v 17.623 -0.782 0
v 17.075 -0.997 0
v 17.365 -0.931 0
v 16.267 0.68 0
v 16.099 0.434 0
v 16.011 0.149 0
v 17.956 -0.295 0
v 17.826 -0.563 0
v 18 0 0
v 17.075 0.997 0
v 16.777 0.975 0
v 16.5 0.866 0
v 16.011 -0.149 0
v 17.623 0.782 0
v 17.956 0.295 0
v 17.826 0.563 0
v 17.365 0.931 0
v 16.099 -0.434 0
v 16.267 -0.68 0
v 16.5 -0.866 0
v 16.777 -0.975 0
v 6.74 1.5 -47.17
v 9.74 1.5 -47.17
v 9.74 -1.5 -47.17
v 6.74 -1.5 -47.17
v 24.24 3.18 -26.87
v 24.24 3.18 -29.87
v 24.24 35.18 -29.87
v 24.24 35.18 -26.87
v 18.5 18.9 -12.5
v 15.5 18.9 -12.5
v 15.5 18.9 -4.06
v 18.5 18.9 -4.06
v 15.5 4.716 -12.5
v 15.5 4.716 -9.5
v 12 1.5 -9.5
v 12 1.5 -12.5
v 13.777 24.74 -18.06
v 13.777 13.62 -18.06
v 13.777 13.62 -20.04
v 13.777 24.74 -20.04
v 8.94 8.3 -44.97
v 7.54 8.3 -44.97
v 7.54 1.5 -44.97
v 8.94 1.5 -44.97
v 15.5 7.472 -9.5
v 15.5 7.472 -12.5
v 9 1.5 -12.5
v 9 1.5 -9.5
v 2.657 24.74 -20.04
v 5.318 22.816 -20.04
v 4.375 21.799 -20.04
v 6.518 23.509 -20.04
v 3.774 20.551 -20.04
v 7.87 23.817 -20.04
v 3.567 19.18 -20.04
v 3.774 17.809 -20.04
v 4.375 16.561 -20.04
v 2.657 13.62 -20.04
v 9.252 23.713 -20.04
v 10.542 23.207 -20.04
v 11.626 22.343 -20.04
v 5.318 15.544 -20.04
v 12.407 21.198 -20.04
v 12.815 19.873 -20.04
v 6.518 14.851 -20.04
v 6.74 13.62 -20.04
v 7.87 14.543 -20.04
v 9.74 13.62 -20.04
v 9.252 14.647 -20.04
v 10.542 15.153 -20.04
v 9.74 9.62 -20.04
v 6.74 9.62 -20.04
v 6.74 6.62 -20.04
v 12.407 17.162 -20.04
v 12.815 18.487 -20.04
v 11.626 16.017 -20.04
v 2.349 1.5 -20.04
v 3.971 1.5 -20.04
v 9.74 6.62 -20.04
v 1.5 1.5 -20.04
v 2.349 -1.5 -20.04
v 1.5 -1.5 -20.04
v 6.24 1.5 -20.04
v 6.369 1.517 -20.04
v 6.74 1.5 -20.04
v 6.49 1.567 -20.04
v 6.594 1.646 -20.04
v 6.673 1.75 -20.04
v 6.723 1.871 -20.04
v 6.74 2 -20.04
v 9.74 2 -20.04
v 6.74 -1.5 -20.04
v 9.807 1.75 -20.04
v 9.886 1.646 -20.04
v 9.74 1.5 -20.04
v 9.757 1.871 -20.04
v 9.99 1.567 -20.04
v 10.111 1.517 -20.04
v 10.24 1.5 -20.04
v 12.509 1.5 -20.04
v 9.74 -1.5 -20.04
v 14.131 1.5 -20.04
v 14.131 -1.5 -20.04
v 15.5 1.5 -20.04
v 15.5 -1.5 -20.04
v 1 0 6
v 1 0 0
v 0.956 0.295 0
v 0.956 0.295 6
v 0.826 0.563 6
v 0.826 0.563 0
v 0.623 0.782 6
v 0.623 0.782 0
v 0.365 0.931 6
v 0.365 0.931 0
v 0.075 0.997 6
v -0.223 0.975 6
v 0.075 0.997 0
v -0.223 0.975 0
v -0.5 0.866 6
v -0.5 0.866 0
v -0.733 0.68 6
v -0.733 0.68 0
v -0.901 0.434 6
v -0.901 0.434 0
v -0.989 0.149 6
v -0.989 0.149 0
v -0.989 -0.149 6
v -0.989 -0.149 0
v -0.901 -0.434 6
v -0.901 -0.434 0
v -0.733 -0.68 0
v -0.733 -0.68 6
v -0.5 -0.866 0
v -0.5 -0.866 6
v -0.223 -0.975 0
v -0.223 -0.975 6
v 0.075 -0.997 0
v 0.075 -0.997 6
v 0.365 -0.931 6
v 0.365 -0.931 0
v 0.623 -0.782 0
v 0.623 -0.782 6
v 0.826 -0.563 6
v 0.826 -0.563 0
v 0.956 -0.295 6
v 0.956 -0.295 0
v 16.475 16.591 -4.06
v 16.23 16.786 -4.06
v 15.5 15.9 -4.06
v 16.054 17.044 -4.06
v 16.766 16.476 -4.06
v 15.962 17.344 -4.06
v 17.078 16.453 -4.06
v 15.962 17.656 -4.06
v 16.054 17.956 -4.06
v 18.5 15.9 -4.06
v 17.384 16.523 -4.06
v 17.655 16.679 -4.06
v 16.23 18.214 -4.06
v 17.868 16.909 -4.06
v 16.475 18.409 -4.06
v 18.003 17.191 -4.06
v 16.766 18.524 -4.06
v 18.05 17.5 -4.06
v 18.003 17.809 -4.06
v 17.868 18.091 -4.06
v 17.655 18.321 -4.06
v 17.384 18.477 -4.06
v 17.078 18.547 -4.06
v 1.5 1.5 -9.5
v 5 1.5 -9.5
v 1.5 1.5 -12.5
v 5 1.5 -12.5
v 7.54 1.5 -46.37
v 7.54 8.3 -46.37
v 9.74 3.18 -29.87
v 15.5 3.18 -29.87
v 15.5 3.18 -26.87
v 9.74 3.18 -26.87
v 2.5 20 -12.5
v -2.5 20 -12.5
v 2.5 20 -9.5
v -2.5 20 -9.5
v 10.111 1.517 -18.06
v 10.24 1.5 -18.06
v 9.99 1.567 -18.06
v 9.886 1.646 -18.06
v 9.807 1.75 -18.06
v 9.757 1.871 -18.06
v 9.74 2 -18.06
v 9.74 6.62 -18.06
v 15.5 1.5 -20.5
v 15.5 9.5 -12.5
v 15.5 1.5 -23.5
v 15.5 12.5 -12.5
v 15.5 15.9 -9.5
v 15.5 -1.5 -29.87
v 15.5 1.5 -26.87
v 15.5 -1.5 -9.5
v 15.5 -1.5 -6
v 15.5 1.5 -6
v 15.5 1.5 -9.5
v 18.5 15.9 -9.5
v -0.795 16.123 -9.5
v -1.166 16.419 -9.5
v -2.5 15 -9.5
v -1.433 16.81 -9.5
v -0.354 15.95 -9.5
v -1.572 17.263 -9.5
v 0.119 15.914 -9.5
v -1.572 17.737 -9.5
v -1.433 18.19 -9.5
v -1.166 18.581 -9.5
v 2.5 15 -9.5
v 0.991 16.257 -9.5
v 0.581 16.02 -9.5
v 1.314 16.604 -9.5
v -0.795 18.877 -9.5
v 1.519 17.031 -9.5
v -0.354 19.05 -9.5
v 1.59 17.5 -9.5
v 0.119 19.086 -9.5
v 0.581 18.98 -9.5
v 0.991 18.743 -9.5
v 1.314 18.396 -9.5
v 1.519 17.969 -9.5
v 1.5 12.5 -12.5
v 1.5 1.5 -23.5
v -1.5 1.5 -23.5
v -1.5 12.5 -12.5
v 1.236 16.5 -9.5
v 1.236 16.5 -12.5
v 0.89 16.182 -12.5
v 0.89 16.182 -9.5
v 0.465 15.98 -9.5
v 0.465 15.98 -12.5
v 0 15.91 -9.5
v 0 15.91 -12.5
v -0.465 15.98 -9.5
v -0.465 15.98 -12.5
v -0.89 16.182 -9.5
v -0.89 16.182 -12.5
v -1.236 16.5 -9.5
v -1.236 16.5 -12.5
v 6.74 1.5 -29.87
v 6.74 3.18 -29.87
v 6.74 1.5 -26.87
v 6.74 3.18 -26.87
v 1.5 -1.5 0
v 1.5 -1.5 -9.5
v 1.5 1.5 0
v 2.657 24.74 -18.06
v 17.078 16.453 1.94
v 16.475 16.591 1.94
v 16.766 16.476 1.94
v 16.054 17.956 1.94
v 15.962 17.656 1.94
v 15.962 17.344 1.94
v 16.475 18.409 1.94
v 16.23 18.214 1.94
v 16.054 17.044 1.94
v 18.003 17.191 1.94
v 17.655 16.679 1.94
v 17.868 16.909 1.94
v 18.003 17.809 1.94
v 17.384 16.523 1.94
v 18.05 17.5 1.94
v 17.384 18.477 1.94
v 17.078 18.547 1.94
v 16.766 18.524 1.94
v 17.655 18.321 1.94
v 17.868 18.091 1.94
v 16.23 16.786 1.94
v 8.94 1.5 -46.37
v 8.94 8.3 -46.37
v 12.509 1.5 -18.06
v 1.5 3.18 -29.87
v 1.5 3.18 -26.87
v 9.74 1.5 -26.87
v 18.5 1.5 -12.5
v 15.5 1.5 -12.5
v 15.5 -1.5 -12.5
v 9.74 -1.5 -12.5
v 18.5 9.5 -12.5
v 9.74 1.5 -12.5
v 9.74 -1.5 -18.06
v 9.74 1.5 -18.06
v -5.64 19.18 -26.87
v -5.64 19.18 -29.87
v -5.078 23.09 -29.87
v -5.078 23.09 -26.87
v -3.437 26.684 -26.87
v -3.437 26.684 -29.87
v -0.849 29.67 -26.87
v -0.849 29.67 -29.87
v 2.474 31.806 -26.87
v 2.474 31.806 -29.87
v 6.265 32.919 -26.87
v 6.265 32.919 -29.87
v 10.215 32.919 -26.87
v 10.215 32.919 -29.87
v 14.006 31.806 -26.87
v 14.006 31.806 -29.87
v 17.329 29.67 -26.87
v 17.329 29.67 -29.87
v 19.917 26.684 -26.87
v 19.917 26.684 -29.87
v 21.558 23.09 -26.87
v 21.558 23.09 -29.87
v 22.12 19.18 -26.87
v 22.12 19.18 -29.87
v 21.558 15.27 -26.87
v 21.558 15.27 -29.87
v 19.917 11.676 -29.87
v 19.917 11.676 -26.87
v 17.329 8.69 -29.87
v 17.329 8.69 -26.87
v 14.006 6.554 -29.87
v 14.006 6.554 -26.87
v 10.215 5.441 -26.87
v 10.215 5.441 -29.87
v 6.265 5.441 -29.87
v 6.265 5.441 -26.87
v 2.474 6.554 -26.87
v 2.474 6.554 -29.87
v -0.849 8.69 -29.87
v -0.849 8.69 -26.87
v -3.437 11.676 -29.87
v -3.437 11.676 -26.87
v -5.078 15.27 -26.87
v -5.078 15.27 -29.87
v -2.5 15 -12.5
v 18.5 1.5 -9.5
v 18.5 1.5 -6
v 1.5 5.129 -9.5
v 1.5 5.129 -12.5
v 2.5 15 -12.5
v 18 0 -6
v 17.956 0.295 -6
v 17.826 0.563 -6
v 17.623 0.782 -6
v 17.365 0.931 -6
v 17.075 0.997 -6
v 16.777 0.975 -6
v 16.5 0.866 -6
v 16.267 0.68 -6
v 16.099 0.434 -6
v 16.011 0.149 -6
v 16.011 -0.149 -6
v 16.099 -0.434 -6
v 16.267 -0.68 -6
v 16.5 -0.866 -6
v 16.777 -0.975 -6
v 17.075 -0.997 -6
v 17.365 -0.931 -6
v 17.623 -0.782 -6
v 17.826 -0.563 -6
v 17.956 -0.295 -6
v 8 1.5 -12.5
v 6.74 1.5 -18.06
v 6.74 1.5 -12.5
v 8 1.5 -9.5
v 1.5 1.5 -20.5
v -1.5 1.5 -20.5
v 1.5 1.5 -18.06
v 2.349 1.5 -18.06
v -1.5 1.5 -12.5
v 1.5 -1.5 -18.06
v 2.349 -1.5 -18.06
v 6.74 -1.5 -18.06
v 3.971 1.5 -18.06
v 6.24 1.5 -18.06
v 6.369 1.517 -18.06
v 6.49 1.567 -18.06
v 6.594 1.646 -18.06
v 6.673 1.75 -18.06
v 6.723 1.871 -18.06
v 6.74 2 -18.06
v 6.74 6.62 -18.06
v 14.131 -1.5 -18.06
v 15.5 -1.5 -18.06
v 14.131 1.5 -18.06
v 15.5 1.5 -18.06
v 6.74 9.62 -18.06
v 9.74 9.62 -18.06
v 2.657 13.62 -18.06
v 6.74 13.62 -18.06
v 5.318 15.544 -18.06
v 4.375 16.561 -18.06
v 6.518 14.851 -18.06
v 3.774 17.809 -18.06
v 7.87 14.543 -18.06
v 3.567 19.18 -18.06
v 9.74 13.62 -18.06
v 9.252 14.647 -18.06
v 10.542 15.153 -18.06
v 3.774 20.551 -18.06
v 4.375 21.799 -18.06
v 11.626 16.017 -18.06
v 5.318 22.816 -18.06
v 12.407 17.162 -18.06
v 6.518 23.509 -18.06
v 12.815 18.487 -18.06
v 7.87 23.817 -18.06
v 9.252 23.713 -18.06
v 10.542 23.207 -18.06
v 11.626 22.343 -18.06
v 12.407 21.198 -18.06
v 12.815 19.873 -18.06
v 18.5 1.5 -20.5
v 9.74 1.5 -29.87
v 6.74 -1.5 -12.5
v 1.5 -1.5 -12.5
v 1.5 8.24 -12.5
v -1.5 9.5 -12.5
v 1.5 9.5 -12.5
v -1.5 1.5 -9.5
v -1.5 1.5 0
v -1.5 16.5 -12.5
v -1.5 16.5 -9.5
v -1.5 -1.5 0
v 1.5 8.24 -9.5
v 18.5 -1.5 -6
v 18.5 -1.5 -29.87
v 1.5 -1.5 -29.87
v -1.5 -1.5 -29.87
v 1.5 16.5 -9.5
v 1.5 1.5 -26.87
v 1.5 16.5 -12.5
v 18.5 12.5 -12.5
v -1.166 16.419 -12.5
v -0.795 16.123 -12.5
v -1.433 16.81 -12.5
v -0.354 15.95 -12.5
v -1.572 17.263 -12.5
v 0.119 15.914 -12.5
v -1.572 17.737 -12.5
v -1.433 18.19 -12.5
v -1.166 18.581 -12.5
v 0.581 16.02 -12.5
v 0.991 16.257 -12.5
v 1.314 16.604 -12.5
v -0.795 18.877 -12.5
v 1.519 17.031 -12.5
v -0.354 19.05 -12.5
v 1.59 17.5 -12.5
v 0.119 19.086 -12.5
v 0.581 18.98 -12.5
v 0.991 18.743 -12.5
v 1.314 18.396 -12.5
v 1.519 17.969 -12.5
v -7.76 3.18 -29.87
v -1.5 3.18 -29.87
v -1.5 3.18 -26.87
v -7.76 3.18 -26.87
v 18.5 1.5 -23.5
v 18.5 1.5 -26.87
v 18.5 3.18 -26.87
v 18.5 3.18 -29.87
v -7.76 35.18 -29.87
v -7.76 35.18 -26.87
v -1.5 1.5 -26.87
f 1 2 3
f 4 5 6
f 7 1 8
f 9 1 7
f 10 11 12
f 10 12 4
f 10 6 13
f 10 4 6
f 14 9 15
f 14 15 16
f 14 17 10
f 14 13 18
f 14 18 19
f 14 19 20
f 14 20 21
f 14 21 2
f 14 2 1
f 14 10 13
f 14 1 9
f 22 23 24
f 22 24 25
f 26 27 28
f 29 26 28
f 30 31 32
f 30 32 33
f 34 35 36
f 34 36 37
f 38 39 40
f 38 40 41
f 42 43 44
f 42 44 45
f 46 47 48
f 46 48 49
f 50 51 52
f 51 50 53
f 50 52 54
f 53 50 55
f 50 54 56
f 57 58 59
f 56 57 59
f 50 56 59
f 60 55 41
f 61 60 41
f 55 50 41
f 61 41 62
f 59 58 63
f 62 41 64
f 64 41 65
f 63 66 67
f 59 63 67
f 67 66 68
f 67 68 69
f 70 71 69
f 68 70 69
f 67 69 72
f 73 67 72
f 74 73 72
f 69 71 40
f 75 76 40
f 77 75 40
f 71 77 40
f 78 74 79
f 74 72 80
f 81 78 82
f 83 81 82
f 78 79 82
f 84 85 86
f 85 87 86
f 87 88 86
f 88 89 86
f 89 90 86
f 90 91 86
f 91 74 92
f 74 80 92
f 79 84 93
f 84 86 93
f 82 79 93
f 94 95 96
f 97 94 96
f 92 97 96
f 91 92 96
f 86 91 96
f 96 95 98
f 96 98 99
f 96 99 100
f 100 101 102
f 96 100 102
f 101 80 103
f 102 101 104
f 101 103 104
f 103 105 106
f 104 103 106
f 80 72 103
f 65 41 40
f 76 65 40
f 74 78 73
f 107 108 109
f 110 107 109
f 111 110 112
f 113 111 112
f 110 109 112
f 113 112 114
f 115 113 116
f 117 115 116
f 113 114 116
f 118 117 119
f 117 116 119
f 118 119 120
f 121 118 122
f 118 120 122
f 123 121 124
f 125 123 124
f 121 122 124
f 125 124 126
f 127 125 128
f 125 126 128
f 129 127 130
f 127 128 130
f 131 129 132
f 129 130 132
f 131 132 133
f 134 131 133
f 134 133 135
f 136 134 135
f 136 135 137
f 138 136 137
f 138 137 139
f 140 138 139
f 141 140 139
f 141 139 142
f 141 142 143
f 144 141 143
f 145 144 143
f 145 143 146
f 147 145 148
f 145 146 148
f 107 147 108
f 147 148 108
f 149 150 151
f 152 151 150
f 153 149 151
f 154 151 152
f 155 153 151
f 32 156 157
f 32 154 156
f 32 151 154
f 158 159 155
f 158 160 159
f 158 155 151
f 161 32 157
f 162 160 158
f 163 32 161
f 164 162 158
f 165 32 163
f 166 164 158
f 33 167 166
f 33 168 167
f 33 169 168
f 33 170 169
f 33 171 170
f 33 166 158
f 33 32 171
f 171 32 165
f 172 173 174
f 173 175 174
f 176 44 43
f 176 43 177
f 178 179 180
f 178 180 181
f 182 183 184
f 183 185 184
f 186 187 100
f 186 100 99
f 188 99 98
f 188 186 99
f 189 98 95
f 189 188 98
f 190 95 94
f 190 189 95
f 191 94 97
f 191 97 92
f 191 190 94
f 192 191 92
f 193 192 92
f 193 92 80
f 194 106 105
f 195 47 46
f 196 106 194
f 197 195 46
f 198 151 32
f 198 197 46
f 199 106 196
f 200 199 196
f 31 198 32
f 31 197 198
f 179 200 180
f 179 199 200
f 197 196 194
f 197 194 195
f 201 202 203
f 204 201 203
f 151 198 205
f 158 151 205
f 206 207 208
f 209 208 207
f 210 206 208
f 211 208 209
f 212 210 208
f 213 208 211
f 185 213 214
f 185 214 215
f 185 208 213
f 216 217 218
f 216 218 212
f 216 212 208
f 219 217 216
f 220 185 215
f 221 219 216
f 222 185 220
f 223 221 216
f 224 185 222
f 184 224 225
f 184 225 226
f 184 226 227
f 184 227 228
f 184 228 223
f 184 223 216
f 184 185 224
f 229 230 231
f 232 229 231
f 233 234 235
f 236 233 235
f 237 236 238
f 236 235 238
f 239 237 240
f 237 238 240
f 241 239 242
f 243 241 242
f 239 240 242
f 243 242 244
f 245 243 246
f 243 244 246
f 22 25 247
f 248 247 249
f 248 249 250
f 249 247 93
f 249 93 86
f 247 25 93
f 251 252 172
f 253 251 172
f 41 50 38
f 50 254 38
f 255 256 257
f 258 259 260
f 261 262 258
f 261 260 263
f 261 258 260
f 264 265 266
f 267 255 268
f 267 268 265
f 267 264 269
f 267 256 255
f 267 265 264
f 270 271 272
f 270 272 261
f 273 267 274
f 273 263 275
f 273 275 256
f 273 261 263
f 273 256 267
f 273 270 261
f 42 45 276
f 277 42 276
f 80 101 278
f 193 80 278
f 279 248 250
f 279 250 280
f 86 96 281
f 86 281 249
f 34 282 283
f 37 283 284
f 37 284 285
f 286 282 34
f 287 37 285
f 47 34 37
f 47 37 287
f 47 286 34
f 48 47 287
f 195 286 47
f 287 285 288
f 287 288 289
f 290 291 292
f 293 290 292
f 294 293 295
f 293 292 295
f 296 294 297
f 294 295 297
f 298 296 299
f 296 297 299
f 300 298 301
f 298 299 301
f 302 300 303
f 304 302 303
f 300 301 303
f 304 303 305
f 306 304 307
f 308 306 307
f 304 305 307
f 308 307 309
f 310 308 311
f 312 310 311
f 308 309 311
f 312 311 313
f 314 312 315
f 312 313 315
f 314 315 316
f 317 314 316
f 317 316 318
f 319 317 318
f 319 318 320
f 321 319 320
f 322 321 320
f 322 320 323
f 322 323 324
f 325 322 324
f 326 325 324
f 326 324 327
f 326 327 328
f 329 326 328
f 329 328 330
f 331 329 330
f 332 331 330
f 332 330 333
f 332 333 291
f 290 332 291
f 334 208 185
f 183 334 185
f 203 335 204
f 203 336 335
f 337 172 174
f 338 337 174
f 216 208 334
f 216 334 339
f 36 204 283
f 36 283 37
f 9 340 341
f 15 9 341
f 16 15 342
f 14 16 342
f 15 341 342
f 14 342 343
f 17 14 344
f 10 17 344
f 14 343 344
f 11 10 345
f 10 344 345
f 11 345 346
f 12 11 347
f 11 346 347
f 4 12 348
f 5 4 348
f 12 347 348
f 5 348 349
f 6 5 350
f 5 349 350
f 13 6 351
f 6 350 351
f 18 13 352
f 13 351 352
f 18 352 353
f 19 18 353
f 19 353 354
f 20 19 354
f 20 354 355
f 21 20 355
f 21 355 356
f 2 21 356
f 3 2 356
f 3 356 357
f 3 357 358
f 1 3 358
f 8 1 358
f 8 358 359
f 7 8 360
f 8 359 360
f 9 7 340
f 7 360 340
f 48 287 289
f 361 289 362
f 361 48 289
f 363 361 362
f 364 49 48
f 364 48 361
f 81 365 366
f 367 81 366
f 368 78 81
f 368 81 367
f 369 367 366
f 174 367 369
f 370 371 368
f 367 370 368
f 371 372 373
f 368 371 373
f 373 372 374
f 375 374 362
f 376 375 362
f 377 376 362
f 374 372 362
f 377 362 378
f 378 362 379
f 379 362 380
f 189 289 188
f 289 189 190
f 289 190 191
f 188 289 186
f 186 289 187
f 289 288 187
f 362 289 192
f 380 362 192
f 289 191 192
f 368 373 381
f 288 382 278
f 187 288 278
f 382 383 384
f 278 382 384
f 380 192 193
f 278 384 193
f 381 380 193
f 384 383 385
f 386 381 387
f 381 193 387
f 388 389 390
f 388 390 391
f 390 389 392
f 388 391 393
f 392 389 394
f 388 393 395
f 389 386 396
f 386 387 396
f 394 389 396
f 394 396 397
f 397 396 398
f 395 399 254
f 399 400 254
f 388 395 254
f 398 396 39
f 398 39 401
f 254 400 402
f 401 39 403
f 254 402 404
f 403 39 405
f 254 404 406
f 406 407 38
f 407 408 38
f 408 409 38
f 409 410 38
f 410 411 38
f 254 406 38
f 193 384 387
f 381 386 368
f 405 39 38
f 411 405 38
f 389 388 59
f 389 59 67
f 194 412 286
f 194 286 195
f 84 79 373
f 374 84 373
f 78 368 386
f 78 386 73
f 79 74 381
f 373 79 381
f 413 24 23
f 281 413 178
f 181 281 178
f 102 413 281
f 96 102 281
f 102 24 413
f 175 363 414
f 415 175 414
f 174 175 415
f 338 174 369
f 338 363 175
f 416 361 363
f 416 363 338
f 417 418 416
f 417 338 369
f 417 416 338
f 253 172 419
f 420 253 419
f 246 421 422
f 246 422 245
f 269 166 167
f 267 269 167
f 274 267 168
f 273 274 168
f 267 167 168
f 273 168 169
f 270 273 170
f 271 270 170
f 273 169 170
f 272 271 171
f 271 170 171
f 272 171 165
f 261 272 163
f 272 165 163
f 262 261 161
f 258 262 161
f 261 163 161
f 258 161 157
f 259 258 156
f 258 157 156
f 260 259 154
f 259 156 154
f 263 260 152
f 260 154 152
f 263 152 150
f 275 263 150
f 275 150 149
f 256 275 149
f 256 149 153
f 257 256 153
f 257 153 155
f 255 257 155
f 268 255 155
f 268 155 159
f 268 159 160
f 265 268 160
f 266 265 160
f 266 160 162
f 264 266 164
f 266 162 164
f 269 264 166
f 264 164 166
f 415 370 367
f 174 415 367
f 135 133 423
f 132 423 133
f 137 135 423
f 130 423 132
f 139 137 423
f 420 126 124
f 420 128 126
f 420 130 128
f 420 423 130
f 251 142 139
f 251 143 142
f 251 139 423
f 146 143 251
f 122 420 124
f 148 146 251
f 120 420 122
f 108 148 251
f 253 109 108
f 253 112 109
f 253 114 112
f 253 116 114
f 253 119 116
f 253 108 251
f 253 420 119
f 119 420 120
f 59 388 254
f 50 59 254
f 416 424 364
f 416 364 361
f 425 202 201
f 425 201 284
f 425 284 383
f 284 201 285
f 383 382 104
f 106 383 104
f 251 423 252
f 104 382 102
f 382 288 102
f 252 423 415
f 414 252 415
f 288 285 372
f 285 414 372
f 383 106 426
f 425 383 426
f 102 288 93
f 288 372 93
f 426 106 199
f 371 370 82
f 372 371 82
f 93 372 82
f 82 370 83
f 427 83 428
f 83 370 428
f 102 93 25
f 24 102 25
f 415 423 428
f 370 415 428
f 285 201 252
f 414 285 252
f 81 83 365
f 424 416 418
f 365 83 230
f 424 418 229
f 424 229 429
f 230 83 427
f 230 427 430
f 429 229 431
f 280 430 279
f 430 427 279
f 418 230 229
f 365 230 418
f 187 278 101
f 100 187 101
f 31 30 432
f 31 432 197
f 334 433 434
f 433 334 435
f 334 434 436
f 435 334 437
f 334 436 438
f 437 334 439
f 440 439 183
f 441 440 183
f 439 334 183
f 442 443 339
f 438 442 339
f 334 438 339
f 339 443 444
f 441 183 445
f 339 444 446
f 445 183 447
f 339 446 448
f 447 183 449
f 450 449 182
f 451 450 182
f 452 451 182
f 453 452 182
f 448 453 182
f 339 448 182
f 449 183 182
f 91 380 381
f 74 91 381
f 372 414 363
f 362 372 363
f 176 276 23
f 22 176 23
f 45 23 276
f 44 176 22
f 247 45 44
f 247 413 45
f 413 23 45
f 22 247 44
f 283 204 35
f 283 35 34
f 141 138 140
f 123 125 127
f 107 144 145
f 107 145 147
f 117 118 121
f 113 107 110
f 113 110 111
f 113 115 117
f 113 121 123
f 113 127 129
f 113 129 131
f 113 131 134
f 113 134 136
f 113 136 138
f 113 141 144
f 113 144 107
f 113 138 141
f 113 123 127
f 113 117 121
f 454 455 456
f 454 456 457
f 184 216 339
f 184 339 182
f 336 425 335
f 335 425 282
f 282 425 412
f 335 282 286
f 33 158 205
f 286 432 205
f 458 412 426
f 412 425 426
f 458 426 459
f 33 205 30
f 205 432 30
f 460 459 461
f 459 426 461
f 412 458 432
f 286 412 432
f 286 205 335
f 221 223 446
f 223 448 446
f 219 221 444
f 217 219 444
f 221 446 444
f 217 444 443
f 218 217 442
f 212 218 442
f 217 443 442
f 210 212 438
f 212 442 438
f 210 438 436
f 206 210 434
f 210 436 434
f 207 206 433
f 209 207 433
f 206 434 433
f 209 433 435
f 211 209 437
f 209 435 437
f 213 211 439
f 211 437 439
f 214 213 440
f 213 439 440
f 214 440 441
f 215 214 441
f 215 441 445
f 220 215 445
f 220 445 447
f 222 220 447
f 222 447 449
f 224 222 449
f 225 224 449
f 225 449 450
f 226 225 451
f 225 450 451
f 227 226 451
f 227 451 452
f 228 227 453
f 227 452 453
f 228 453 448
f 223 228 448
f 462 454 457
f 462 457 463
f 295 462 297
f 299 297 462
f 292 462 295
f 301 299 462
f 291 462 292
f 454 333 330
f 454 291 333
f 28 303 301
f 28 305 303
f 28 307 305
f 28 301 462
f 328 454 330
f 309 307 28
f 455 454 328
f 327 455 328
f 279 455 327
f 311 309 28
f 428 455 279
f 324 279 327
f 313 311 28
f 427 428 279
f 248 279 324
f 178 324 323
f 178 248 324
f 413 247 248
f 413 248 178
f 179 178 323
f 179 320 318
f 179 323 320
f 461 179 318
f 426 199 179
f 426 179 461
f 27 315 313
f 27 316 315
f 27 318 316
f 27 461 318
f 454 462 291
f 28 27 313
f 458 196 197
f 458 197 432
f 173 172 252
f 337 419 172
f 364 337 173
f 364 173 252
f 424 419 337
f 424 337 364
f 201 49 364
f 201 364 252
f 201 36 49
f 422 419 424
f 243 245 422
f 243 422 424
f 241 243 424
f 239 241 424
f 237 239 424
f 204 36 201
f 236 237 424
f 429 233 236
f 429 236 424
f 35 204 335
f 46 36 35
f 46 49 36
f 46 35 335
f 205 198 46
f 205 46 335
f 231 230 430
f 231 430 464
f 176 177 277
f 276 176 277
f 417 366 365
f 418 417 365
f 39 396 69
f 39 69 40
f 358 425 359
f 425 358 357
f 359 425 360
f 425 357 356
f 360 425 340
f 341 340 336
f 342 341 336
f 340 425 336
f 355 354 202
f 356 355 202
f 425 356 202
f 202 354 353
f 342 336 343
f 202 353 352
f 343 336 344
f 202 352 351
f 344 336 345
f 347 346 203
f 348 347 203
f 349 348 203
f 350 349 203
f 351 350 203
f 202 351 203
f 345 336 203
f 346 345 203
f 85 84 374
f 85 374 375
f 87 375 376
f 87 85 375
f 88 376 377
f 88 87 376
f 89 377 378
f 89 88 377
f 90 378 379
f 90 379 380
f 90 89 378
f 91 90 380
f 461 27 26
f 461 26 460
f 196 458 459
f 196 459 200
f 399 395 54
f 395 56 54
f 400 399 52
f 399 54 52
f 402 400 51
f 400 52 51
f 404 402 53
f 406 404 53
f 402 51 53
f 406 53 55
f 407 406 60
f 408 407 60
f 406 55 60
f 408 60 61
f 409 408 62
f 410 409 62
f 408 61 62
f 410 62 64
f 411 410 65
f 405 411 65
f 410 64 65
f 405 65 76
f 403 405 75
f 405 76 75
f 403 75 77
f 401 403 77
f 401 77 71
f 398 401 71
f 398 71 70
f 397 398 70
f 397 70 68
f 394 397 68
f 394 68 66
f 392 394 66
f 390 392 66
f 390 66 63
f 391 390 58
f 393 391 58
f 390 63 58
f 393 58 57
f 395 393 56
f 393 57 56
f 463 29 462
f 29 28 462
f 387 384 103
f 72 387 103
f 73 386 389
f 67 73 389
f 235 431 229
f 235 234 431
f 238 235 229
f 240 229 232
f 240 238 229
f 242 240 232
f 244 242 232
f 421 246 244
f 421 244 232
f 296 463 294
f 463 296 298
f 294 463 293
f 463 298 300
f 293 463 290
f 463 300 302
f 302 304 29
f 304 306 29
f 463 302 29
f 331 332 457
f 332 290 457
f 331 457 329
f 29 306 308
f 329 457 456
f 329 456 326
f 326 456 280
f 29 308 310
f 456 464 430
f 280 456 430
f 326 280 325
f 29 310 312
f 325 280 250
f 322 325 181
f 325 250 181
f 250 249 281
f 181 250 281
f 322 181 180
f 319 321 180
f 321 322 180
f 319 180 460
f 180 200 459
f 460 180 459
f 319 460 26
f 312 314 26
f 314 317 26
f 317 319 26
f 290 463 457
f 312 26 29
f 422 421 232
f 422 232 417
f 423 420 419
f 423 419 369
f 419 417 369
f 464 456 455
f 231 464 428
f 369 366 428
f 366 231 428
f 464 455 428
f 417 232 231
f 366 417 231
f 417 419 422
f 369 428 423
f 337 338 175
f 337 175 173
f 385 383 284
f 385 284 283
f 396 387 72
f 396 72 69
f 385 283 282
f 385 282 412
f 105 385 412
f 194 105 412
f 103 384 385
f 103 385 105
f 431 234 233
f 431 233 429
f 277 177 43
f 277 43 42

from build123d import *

# Parameters (mm, degrees)
SKETCH3_W            = 3
SKETCH3_H            = 3
SKETCH7_W            = 3
SKETCH7_H            = 3
BOSS_EXTRUDE1_DEPTH  = 16.5
SKETCH12_W           = 5
SKETCH12_H           = 5
BOSS_EXTRUDE4_DEPTH  = 1.5
SKETCH17_R           = 1
BOSS_EXTRUDE5_DEPTH  = 6
SKETCH18_R           = 1
BOSS_EXTRUDE6_DEPTH  = 6
SKETCH19_W           = 3
SKETCH19_H           = 3
BOSS_EXTRUDE7_DEPTH  = 7.54
SKETCH21_W           = 3
SKETCH21_H           = 1.98
BOSS_EXTRUDE8_DEPTH  = 17.68
SKETCH22_W           = 11.12
SKETCH22_H           = 11.12
BOSS_EXTRUDE9_DEPTH  = 0.99
SKETCH23_R           = 4.65
CUT_EXTRUDE2_DEPTH   = 2.5
SKETCH24_W           = 3
SKETCH24_H           = 3
BOSS_EXTRUDE10_DEPTH = 9.83
SKETCH25_W           = 3
SKETCH25_H           = 3
BOSS_EXTRUDE11_DEPTH = 3
SKETCH27_W           = 32
SKETCH27_H           = 32
BOSS_EXTRUDE12_DEPTH = 1.5
SKETCH28_R           = 13.88
CUT_EXTRUDE3_DEPTH   = 7
SKETCH31_W           = 3
SKETCH31_H           = 3
BOSS_EXTRUDE13_DEPTH = 17.3
SKETCH32_W           = 1.4
SKETCH32_H           = 1.4
BOSS_EXTRUDE14_DEPTH = 6.8
SKETCH33_W           = 3
SKETCH33_H           = 3
BOSS_EXTRUDE15_DEPTH = 17.37
SKETCH34_W           = 3
SKETCH34_H           = 3
BOSS_EXTRUDE16_DEPTH = 5.5
SKETCH36_W           = 3
SKETCH36_H           = 3
SKETCH16_R           = 1.59
CUT_EXTRUDE7_DEPTH   = 5
SKETCH41_W           = 3
SKETCH41_H           = 3
BOSS_EXTRUDE17_DEPTH = 17.37
SKETCH42_W           = 3
SKETCH42_H           = 3
BOSS_EXTRUDE18_DEPTH = 5
SKETCH43_W           = 3
SKETCH43_H           = 3
BOSS_EXTRUDE19_DEPTH = 17.4
SKETCH47_W           = 3
SKETCH47_H           = 3
SKETCH53_W           = 3
SKETCH53_H           = 3
BOSS_EXTRUDE20_REACH = 63.391
SKETCH55_W           = 1.98
SKETCH55_H           = 3
BOSS_EXTRUDE21_REACH = 63.391
SKETCH56_W           = 1.98
SKETCH56_H           = 3
FILLET1_R            = 0.5
FILLET2_R            = 0.5
SKETCH57_W           = 1.98
SKETCH57_H           = 3
SKETCH59_W           = 3
SKETCH59_H           = 3
BOSS_EXTRUDE22_DEPTH = 5.44
SKETCH63_R           = 1.05
BOSS_EXTRUDE25_DEPTH = 6


with BuildPart() as part:
    # Sweep3: sweep along a path in Sketch4
    with BuildLine(Plane(origin=(0, 0, 0), x_dir=(1, 0, 0), z_dir=(0, 1, 0))) as sweep3_path:
        Line((0, 0), (0, 11))
        Line((0, 11), (17, 11))
        Line((17, 11), (17, 6))
    # Sketch3 → Sweep3 (sweep)
    with BuildSketch(Plane.XY):
        Rectangle(SKETCH3_W, SKETCH3_H)
    sweep(path=sweep3_path.line, transition=Transition.RIGHT)

    # Sketch7 → Boss-Extrude1 (add)
    with BuildSketch(Plane(origin=(0, 0, 0), x_dir=(1, 0, 0), z_dir=(0, 1, 0))):
        with Locations((0, 11)):
            Rectangle(SKETCH7_W, SKETCH7_H)
    extrude(amount=BOSS_EXTRUDE1_DEPTH)

    # Sketch17 → Boss-Extrude5 (add)
    with BuildSketch(Plane.XY):
        Circle(SKETCH17_R)
    extrude(amount=BOSS_EXTRUDE5_DEPTH)

    # Sketch18 → Boss-Extrude6 (add)
    with BuildSketch(Plane.XY.offset(-6)):
        with Locations((17, 0)):
            Circle(SKETCH18_R)
    extrude(amount=BOSS_EXTRUDE6_DEPTH)

    # Sweep4: sweep along a path in Sketch39
    with BuildLine(Plane.XY.offset(-11)) as sweep4_path:
        Line((6.5, 1.5), (0, 8.24))
    # Sketch36 → Sweep4 (sweep)
    with BuildSketch(Plane(origin=(0, 1.5, 0), x_dir=(1, 0, 0), z_dir=(0, 1, 0))):
        with Locations((6.5, 11)):
            Rectangle(SKETCH36_W, SKETCH36_H)
    sweep(path=sweep4_path.line)


with BuildPart() as body_2:
    # Sketch12 → Boss-Extrude4 (new, symmetric)
    with BuildSketch(Plane.XY.offset(-11)):
        with Locations((0, 17.5)):
            Rectangle(SKETCH12_W, SKETCH12_H)
    extrude(amount=BOSS_EXTRUDE4_DEPTH, both=True)


with BuildPart() as body_3:
    # Sketch19 → Boss-Extrude7 (new body)
    with BuildSketch(Plane.XY.offset(-12.5)):
        with Locations((8.24, 0)):
            Rectangle(SKETCH19_W, SKETCH19_H)
    extrude(amount=-BOSS_EXTRUDE7_DEPTH)

    # Sketch21 → Boss-Extrude8 (add)
    with BuildSketch(Plane(origin=(0, 1.5, 0), x_dir=(1, 0, 0), z_dir=(0, 1, 0))):
        with Locations((8.24, 19.05)):
            Rectangle(SKETCH21_W, SKETCH21_H)
    extrude(amount=BOSS_EXTRUDE8_DEPTH)

    # Sketch22 → Boss-Extrude9 (add, symmetric)
    with BuildSketch(Plane.XY.offset(-19.05)):
        with Locations((8.217064706, 19.179985124)):
            Rectangle(SKETCH22_W, SKETCH22_H)
    extrude(amount=BOSS_EXTRUDE9_DEPTH, both=True)

    # Sketch23 → Cut-Extrude2 (cut, symmetric)
    with BuildSketch(Plane(origin=(0, 0, -20.04), x_dir=(-1, 0, 0), z_dir=(0, 0, -1))):
        with Locations((-8.217064706, 19.179985124)):
            Circle(SKETCH23_R)
    extrude(amount=CUT_EXTRUDE2_DEPTH, both=True, mode=Mode.SUBTRACT)

    # Sketch24 → Boss-Extrude10 (add)
    with BuildSketch(Plane(origin=(0, 0, -20.04), x_dir=(-1, 0, 0), z_dir=(0, 0, -1))):
        with Locations((-8.24, 0)):
            Rectangle(SKETCH24_W, SKETCH24_H)
    extrude(amount=BOSS_EXTRUDE10_DEPTH)

    # Sketch25 → Boss-Extrude11 (add)
    with BuildSketch(Plane(origin=(0, 1.5, 0), x_dir=(1, 0, 0), z_dir=(0, 1, 0))):
        with Locations((8.24, 28.37)):
            Rectangle(SKETCH25_W, SKETCH25_H)
    extrude(amount=BOSS_EXTRUDE11_DEPTH)

    # Sketch27 → Boss-Extrude12 (add, symmetric)
    with BuildSketch(Plane(origin=(0, 0, -28.37), x_dir=(-1, 0, 0), z_dir=(0, 0, -1))):
        with Locations((-8.24, 19.18)):
            Rectangle(SKETCH27_W, SKETCH27_H)
    extrude(amount=BOSS_EXTRUDE12_DEPTH, both=True)

    # Sketch28 → Cut-Extrude3 (cut)
    with BuildSketch(Plane(origin=(0, 0, -29.87), x_dir=(-1, 0, 0), z_dir=(0, 0, -1))):
        with Locations((-8.24, 19.18)):
            Circle(SKETCH28_R)
    extrude(amount=-CUT_EXTRUDE3_DEPTH, mode=Mode.SUBTRACT)

    # Sketch31 → Boss-Extrude13 (add)
    with BuildSketch(Plane(origin=(0, 0, -29.87), x_dir=(-1, 0, 0), z_dir=(0, 0, -1))):
        with Locations((-8.24, 0)):
            Rectangle(SKETCH31_W, SKETCH31_H)
    extrude(amount=BOSS_EXTRUDE13_DEPTH)

    # Sketch32 → Boss-Extrude14 (add)
    with BuildSketch(Plane(origin=(0, 1.5, 0), x_dir=(1, 0, 0), z_dir=(0, 1, 0))):
        with Locations((8.24, 45.67)):
            Rectangle(SKETCH32_W, SKETCH32_H)
    extrude(amount=BOSS_EXTRUDE14_DEPTH)



with BuildPart() as body_4:
    # Sketch33 → Boss-Extrude15 (new body)
    with BuildSketch(Plane(origin=(0, 0, -12.5), x_dir=(-1, 0, 0), z_dir=(0, 0, -1))):
        with Locations((-17, 0)):
            Rectangle(SKETCH33_W, SKETCH33_H)
    extrude(amount=BOSS_EXTRUDE15_DEPTH)

    # Sketch34 → Boss-Extrude16 (add)
    with BuildSketch(Plane(origin=(0, 1.5, 0), x_dir=(1, 0, 0), z_dir=(0, 1, 0))):
        with Locations((17, 28.37)):
            Rectangle(SKETCH34_W, SKETCH34_H)
    extrude(amount=BOSS_EXTRUDE16_DEPTH)


with BuildPart() as cut_extrude7_tool:
    # Sketch16 → Cut-Extrude7 (new, symmetric)
    with BuildSketch(Plane(origin=(0, 0, -12.5), x_dir=(-1, 0, 0), z_dir=(0, 0, -1))):
        with Locations(Location((0, 17.5, 0), (0, 0, 180))):
            Circle(SKETCH16_R)
    extrude(amount=CUT_EXTRUDE7_DEPTH, both=True)


with BuildPart() as part_1:
    add(part.part)

    # Cut-Extrude7: cut by cut_extrude7_tool
    add(cut_extrude7_tool.part, mode=Mode.SUBTRACT)


with BuildPart() as body_2_1:
    add(body_2.part)

    # Cut-Extrude7: cut by cut_extrude7_tool
    add(cut_extrude7_tool.part, mode=Mode.SUBTRACT)


with BuildPart() as body_3_1:
    add(body_3.part)

    add(part_1.part)  # Boss-Extrude17 merges part
    # Sketch41 → Boss-Extrude17 (add)
    with BuildSketch(Plane(origin=(0, 0, -12.5), x_dir=(-1, 0, 0), z_dir=(0, 0, -1))):
        Rectangle(SKETCH41_W, SKETCH41_H)
    extrude(amount=BOSS_EXTRUDE17_DEPTH)

    # Sketch42 → Boss-Extrude18 (add)
    with BuildSketch(Plane(origin=(0, 1.5, 0), x_dir=(1, 0, 0), z_dir=(0, 1, 0))):
        with Locations((0, 28.37)):
            Rectangle(SKETCH42_W, SKETCH42_H)
    extrude(amount=BOSS_EXTRUDE18_DEPTH)


    add(body_4.part)  # Boss-Extrude19 merges body 4
    # Sketch43 → Boss-Extrude19 (add)
    with BuildSketch(Plane(origin=(0, 1.5, 0), x_dir=(1, 0, 0), z_dir=(0, 1, 0))):
        with Locations((17, 11)):
            Rectangle(SKETCH43_W, SKETCH43_H)
    extrude(amount=BOSS_EXTRUDE19_DEPTH)

    # Sweep5: sweep along a path in Sketch51
    with BuildLine(Plane.XY.offset(-11)) as sweep5_path:
        Line((10.5, 1.5), (17, 7.472026952))
    # Sketch47 → Sweep5 (sweep)
    with BuildSketch(Plane(origin=(0, 1.5, 0), x_dir=(1, 0, 0), z_dir=(0, 1, 0))):
        with Locations((10.5, 11)):
            Rectangle(SKETCH47_W, SKETCH47_H)
    sweep(path=sweep5_path.line)

    # Sweep6: sweep along a path in Sketch54
    with BuildLine(Plane.ZY.offset(1.5)) as sweep6_path:
        Line((-12.5, 11), (-23.5, 0))
    # Sketch53 → Sweep6 (sweep)
    with BuildSketch(Plane.XY.offset(-12.5)):
        with Locations((0, 11)):
            Rectangle(SKETCH53_W, SKETCH53_H)
    sweep6 = sweep(path=sweep6_path.line)

    # Mirror11: Sweep6 across plane
    add(sweep6.mirror(Plane.ZY.offset(-8.5)))

    # Sketch55 → Boss-Extrude20 (add, up to next)
    with BuildSketch(Plane.ZY.offset(-6.74), mode=Mode.PRIVATE) as boss_extrude20_sk1:
        with Locations((-19.05, 0)):
            Rectangle(SKETCH55_W, SKETCH55_H)
    boss_extrude20_tool1 = extrude(boss_extrude20_sk1.sketch, amount=BOSS_EXTRUDE20_REACH, mode=Mode.PRIVATE) - body_3_1.part
    add(boss_extrude20_tool1.solids().sort_by_distance((6.74, 0, -19.05))[0])

    # Sketch56 → Boss-Extrude21 (add, up to next)
    with BuildSketch(Plane(origin=(9.74, 0, 0), x_dir=(0, 0, -1), z_dir=(1, 0, 0)), mode=Mode.PRIVATE) as boss_extrude21_sk1:
        with Locations((19.05, 0)):
            Rectangle(SKETCH56_W, SKETCH56_H)
    boss_extrude21_tool1 = extrude(boss_extrude21_sk1.sketch, amount=BOSS_EXTRUDE21_REACH, mode=Mode.PRIVATE) - body_3_1.part
    add(boss_extrude21_tool1.solids().sort_by_distance((9.74, 0, -19.05))[0])

    # Fillet1
    # the kernel refuses this fillet: 0.5 mm, written as the material it adds along each edge
    with BuildSketch(Plane(origin=(6.74, 1.5, -20.04), x_dir=(-1, 0, 0), z_dir=(0, 0, 1))) as fillet1_piece_1:
        with BuildLine():
            CenterArc((FILLET1_R, -FILLET1_R), FILLET1_R, 90, 90)
            Line((0, -FILLET1_R), (0, 0))
            Line((0, 0), (FILLET1_R, 0))
        make_face()
    extrude(amount=1.98)

    # Fillet2
    # the kernel refuses this fillet: 0.5 mm, written as the material it adds along each edge
    with BuildSketch(Plane(origin=(9.74, 1.5, -18.06), x_dir=(0, 1, 0), z_dir=(0, 0, -1))) as fillet2_piece_1:
        with BuildLine():
            CenterArc((FILLET2_R, FILLET2_R), FILLET2_R, 180, 90)
            Line((0, FILLET2_R), (0, 0))
            Line((0, 0), (FILLET2_R, 0))
        make_face()
    extrude(amount=1.98)

    # Sweep7: sweep along a path in Sketch58
    with BuildLine(Plane.XY.offset(-19.05)) as sweep7_path:
        Line((6.74, 8.119985124), (2.349216677, 0))
    # Sketch57 → Sweep7 (sweep)
    with BuildSketch(Plane.ZY.offset(-6.74)):
        with Locations((-19.05, 8.119985124)):
            Rectangle(SKETCH57_W, SKETCH57_H)
    sweep7 = sweep(path=sweep7_path.line)

    # Mirror13: Sweep7 across plane
    add(sweep7.mirror(Plane.ZY.offset(-8.24)))

    # Sketch59 → Boss-Extrude22 (add)
    with BuildSketch(Plane.XY.offset(-9.5)):
        with Locations((17, 17.4)):
            Rectangle(SKETCH59_W, SKETCH59_H)
    extrude(amount=BOSS_EXTRUDE22_DEPTH)

    # Sketch63 → Boss-Extrude25 (add)
    with BuildSketch(Plane.XY.offset(-4.06)):
        with Locations((17, 17.5)):
            Circle(SKETCH63_R)
    extrude(amount=BOSS_EXTRUDE25_DEPTH)


solid = Compound([body_2_1.part, body_3_1.part])
